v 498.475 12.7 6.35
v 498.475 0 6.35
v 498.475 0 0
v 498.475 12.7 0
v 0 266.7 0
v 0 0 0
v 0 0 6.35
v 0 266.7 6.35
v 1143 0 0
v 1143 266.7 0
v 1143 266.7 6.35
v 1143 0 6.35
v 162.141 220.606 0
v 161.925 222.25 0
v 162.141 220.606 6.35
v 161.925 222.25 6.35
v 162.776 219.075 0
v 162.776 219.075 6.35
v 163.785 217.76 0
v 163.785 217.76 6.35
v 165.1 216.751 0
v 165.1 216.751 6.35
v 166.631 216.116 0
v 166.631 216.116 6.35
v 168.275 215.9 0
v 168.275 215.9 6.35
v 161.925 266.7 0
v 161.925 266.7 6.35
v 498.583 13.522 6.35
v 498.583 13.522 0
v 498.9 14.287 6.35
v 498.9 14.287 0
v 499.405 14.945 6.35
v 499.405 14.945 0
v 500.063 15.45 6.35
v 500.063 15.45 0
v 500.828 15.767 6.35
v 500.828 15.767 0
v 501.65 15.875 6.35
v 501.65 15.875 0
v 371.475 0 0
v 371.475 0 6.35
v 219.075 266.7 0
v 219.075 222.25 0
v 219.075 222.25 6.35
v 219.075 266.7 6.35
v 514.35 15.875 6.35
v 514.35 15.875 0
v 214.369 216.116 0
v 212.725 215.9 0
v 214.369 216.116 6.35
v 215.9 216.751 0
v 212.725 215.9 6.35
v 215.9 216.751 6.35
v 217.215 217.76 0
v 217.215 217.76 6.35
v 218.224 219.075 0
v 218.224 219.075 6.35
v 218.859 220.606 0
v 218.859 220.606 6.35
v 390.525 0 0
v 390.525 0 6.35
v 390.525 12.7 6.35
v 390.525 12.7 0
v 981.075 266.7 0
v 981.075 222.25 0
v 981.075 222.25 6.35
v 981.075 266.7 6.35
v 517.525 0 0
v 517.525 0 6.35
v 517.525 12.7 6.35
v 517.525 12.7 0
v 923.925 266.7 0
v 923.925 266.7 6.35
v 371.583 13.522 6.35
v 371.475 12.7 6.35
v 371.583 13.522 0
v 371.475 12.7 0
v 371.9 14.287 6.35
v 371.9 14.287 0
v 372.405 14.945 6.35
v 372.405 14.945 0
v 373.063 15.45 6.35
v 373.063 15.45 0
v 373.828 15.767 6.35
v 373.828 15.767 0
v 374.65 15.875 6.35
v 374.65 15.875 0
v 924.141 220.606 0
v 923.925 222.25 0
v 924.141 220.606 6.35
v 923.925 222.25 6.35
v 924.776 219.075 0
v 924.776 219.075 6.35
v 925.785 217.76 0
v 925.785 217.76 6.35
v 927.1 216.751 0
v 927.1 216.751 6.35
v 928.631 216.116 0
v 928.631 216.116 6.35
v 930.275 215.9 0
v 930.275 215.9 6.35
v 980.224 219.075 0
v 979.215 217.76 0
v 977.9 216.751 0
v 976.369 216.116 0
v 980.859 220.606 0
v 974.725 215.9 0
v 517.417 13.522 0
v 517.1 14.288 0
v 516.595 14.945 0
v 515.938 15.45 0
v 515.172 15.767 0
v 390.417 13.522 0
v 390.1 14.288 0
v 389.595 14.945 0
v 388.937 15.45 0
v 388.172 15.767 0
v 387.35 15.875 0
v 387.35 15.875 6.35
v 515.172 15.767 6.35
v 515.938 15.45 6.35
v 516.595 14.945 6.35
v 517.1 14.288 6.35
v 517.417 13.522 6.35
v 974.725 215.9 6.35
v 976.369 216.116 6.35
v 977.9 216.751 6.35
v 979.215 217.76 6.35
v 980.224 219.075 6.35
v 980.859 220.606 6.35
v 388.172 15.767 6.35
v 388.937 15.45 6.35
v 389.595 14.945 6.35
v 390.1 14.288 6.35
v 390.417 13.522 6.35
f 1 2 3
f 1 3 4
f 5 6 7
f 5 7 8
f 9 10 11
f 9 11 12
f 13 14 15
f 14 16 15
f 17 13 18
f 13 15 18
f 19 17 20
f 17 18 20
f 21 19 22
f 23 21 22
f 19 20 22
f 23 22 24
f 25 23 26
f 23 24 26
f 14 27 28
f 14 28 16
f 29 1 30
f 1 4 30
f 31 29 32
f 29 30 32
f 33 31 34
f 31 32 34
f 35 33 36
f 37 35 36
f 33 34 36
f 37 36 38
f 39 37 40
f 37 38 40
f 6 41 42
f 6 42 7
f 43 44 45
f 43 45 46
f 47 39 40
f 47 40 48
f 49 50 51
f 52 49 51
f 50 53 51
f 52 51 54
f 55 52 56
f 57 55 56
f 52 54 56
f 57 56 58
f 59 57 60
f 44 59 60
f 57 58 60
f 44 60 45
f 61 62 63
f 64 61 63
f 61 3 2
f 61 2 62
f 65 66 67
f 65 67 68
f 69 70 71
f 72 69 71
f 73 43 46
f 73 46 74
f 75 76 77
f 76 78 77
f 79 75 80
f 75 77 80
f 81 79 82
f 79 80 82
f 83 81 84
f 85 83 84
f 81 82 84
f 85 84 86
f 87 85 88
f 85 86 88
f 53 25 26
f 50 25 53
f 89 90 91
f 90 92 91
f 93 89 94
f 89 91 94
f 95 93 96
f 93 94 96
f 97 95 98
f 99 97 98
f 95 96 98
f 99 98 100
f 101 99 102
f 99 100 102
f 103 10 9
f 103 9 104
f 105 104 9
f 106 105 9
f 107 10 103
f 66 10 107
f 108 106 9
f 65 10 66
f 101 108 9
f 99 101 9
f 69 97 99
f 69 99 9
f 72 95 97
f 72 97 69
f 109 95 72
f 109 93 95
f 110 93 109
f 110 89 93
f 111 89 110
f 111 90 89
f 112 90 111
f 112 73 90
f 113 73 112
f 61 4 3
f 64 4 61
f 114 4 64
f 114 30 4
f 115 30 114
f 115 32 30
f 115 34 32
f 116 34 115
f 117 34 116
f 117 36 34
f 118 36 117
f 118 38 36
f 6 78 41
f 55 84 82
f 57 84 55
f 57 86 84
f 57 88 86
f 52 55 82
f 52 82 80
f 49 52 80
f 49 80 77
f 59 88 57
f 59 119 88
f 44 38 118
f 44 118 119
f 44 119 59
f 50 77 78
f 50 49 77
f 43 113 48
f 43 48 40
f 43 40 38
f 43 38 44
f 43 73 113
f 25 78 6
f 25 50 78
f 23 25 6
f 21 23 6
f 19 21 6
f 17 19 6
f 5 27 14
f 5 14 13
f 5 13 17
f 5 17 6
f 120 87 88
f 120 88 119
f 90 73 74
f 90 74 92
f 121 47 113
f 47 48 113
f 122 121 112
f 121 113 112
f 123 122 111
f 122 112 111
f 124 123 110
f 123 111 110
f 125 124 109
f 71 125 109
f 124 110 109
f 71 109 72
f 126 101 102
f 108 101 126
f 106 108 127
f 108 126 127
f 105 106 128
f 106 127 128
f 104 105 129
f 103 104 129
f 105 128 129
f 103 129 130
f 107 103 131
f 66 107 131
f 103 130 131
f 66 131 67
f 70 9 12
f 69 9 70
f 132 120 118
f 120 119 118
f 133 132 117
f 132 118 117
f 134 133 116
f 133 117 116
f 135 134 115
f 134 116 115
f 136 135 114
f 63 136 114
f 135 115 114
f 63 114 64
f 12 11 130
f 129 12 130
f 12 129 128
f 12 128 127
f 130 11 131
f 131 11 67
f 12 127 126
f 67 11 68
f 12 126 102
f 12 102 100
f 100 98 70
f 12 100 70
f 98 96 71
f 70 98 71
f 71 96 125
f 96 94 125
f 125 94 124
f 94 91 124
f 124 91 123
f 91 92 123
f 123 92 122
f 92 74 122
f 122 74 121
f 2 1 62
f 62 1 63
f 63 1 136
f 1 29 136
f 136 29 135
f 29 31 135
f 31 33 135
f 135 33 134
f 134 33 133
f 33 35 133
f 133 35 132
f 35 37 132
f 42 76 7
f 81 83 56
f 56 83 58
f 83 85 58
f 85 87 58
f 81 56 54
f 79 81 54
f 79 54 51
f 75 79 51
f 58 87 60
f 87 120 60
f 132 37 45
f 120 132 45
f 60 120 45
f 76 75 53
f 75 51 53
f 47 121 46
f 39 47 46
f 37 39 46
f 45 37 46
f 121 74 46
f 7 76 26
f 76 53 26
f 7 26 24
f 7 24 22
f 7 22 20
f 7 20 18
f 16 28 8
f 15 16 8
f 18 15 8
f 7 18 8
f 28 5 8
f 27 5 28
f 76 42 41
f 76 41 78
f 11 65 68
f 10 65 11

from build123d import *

# Parameters (mm, degrees)
BOSS_EXTRUDE1_DEPTH = 6.35
FILLET1_R           = 6.35
SKETCH2_W           = 19.05
SKETCH2_H           = 15.875
CUT_EXTRUDE1_DEPTH  = 7.35
FILLET2_R           = 3.175


with BuildPart() as part:
    # Sketch1 → Boss-Extrude1 (new body)
    with BuildSketch(Plane.XY):
        Polygon((0, 0), (0, 266.7), (161.925, 266.7), (161.925, 215.9), (219.075, 215.9), (219.075, 266.7), (923.925, 266.7), (923.925, 215.9), (981.075, 215.9), (981.075, 266.7), (1143, 266.7), (1143, 0), align=None)
    extrude(amount=BOSS_EXTRUDE1_DEPTH)

    # Fillet1
    fillet1_edges = [part.edges().sort_by_distance(p)[0] for p in [
        (161.925, 215.9, 3.175),
        (219.075, 215.9, 3.175),
        (923.925, 215.9, 3.175),
        (981.075, 215.9, 3.175),
    ]]
    fillet(fillet1_edges, radius=FILLET1_R)

    # Sketch2 → Cut-Extrude1 (cut, through all)
    with BuildSketch(Plane.XY.offset(6.35)):
        with Locations((381, 7.9375)):
            Rectangle(SKETCH2_W, SKETCH2_H)
        with Locations((508, 7.9375)):
            Rectangle(SKETCH2_W, SKETCH2_H)
    extrude(amount=-CUT_EXTRUDE1_DEPTH, mode=Mode.SUBTRACT)

    # Fillet2
    fillet2_edges = [part.edges().sort_by_distance(p)[0] for p in [
        (371.475, 15.875, 3.175),
        (390.525, 15.875, 3.175),
        (498.475, 15.875, 3.175),
        (517.525, 15.875, 3.175),
    ]]
    fillet(fillet2_edges, radius=FILLET2_R)


solid = part.part
